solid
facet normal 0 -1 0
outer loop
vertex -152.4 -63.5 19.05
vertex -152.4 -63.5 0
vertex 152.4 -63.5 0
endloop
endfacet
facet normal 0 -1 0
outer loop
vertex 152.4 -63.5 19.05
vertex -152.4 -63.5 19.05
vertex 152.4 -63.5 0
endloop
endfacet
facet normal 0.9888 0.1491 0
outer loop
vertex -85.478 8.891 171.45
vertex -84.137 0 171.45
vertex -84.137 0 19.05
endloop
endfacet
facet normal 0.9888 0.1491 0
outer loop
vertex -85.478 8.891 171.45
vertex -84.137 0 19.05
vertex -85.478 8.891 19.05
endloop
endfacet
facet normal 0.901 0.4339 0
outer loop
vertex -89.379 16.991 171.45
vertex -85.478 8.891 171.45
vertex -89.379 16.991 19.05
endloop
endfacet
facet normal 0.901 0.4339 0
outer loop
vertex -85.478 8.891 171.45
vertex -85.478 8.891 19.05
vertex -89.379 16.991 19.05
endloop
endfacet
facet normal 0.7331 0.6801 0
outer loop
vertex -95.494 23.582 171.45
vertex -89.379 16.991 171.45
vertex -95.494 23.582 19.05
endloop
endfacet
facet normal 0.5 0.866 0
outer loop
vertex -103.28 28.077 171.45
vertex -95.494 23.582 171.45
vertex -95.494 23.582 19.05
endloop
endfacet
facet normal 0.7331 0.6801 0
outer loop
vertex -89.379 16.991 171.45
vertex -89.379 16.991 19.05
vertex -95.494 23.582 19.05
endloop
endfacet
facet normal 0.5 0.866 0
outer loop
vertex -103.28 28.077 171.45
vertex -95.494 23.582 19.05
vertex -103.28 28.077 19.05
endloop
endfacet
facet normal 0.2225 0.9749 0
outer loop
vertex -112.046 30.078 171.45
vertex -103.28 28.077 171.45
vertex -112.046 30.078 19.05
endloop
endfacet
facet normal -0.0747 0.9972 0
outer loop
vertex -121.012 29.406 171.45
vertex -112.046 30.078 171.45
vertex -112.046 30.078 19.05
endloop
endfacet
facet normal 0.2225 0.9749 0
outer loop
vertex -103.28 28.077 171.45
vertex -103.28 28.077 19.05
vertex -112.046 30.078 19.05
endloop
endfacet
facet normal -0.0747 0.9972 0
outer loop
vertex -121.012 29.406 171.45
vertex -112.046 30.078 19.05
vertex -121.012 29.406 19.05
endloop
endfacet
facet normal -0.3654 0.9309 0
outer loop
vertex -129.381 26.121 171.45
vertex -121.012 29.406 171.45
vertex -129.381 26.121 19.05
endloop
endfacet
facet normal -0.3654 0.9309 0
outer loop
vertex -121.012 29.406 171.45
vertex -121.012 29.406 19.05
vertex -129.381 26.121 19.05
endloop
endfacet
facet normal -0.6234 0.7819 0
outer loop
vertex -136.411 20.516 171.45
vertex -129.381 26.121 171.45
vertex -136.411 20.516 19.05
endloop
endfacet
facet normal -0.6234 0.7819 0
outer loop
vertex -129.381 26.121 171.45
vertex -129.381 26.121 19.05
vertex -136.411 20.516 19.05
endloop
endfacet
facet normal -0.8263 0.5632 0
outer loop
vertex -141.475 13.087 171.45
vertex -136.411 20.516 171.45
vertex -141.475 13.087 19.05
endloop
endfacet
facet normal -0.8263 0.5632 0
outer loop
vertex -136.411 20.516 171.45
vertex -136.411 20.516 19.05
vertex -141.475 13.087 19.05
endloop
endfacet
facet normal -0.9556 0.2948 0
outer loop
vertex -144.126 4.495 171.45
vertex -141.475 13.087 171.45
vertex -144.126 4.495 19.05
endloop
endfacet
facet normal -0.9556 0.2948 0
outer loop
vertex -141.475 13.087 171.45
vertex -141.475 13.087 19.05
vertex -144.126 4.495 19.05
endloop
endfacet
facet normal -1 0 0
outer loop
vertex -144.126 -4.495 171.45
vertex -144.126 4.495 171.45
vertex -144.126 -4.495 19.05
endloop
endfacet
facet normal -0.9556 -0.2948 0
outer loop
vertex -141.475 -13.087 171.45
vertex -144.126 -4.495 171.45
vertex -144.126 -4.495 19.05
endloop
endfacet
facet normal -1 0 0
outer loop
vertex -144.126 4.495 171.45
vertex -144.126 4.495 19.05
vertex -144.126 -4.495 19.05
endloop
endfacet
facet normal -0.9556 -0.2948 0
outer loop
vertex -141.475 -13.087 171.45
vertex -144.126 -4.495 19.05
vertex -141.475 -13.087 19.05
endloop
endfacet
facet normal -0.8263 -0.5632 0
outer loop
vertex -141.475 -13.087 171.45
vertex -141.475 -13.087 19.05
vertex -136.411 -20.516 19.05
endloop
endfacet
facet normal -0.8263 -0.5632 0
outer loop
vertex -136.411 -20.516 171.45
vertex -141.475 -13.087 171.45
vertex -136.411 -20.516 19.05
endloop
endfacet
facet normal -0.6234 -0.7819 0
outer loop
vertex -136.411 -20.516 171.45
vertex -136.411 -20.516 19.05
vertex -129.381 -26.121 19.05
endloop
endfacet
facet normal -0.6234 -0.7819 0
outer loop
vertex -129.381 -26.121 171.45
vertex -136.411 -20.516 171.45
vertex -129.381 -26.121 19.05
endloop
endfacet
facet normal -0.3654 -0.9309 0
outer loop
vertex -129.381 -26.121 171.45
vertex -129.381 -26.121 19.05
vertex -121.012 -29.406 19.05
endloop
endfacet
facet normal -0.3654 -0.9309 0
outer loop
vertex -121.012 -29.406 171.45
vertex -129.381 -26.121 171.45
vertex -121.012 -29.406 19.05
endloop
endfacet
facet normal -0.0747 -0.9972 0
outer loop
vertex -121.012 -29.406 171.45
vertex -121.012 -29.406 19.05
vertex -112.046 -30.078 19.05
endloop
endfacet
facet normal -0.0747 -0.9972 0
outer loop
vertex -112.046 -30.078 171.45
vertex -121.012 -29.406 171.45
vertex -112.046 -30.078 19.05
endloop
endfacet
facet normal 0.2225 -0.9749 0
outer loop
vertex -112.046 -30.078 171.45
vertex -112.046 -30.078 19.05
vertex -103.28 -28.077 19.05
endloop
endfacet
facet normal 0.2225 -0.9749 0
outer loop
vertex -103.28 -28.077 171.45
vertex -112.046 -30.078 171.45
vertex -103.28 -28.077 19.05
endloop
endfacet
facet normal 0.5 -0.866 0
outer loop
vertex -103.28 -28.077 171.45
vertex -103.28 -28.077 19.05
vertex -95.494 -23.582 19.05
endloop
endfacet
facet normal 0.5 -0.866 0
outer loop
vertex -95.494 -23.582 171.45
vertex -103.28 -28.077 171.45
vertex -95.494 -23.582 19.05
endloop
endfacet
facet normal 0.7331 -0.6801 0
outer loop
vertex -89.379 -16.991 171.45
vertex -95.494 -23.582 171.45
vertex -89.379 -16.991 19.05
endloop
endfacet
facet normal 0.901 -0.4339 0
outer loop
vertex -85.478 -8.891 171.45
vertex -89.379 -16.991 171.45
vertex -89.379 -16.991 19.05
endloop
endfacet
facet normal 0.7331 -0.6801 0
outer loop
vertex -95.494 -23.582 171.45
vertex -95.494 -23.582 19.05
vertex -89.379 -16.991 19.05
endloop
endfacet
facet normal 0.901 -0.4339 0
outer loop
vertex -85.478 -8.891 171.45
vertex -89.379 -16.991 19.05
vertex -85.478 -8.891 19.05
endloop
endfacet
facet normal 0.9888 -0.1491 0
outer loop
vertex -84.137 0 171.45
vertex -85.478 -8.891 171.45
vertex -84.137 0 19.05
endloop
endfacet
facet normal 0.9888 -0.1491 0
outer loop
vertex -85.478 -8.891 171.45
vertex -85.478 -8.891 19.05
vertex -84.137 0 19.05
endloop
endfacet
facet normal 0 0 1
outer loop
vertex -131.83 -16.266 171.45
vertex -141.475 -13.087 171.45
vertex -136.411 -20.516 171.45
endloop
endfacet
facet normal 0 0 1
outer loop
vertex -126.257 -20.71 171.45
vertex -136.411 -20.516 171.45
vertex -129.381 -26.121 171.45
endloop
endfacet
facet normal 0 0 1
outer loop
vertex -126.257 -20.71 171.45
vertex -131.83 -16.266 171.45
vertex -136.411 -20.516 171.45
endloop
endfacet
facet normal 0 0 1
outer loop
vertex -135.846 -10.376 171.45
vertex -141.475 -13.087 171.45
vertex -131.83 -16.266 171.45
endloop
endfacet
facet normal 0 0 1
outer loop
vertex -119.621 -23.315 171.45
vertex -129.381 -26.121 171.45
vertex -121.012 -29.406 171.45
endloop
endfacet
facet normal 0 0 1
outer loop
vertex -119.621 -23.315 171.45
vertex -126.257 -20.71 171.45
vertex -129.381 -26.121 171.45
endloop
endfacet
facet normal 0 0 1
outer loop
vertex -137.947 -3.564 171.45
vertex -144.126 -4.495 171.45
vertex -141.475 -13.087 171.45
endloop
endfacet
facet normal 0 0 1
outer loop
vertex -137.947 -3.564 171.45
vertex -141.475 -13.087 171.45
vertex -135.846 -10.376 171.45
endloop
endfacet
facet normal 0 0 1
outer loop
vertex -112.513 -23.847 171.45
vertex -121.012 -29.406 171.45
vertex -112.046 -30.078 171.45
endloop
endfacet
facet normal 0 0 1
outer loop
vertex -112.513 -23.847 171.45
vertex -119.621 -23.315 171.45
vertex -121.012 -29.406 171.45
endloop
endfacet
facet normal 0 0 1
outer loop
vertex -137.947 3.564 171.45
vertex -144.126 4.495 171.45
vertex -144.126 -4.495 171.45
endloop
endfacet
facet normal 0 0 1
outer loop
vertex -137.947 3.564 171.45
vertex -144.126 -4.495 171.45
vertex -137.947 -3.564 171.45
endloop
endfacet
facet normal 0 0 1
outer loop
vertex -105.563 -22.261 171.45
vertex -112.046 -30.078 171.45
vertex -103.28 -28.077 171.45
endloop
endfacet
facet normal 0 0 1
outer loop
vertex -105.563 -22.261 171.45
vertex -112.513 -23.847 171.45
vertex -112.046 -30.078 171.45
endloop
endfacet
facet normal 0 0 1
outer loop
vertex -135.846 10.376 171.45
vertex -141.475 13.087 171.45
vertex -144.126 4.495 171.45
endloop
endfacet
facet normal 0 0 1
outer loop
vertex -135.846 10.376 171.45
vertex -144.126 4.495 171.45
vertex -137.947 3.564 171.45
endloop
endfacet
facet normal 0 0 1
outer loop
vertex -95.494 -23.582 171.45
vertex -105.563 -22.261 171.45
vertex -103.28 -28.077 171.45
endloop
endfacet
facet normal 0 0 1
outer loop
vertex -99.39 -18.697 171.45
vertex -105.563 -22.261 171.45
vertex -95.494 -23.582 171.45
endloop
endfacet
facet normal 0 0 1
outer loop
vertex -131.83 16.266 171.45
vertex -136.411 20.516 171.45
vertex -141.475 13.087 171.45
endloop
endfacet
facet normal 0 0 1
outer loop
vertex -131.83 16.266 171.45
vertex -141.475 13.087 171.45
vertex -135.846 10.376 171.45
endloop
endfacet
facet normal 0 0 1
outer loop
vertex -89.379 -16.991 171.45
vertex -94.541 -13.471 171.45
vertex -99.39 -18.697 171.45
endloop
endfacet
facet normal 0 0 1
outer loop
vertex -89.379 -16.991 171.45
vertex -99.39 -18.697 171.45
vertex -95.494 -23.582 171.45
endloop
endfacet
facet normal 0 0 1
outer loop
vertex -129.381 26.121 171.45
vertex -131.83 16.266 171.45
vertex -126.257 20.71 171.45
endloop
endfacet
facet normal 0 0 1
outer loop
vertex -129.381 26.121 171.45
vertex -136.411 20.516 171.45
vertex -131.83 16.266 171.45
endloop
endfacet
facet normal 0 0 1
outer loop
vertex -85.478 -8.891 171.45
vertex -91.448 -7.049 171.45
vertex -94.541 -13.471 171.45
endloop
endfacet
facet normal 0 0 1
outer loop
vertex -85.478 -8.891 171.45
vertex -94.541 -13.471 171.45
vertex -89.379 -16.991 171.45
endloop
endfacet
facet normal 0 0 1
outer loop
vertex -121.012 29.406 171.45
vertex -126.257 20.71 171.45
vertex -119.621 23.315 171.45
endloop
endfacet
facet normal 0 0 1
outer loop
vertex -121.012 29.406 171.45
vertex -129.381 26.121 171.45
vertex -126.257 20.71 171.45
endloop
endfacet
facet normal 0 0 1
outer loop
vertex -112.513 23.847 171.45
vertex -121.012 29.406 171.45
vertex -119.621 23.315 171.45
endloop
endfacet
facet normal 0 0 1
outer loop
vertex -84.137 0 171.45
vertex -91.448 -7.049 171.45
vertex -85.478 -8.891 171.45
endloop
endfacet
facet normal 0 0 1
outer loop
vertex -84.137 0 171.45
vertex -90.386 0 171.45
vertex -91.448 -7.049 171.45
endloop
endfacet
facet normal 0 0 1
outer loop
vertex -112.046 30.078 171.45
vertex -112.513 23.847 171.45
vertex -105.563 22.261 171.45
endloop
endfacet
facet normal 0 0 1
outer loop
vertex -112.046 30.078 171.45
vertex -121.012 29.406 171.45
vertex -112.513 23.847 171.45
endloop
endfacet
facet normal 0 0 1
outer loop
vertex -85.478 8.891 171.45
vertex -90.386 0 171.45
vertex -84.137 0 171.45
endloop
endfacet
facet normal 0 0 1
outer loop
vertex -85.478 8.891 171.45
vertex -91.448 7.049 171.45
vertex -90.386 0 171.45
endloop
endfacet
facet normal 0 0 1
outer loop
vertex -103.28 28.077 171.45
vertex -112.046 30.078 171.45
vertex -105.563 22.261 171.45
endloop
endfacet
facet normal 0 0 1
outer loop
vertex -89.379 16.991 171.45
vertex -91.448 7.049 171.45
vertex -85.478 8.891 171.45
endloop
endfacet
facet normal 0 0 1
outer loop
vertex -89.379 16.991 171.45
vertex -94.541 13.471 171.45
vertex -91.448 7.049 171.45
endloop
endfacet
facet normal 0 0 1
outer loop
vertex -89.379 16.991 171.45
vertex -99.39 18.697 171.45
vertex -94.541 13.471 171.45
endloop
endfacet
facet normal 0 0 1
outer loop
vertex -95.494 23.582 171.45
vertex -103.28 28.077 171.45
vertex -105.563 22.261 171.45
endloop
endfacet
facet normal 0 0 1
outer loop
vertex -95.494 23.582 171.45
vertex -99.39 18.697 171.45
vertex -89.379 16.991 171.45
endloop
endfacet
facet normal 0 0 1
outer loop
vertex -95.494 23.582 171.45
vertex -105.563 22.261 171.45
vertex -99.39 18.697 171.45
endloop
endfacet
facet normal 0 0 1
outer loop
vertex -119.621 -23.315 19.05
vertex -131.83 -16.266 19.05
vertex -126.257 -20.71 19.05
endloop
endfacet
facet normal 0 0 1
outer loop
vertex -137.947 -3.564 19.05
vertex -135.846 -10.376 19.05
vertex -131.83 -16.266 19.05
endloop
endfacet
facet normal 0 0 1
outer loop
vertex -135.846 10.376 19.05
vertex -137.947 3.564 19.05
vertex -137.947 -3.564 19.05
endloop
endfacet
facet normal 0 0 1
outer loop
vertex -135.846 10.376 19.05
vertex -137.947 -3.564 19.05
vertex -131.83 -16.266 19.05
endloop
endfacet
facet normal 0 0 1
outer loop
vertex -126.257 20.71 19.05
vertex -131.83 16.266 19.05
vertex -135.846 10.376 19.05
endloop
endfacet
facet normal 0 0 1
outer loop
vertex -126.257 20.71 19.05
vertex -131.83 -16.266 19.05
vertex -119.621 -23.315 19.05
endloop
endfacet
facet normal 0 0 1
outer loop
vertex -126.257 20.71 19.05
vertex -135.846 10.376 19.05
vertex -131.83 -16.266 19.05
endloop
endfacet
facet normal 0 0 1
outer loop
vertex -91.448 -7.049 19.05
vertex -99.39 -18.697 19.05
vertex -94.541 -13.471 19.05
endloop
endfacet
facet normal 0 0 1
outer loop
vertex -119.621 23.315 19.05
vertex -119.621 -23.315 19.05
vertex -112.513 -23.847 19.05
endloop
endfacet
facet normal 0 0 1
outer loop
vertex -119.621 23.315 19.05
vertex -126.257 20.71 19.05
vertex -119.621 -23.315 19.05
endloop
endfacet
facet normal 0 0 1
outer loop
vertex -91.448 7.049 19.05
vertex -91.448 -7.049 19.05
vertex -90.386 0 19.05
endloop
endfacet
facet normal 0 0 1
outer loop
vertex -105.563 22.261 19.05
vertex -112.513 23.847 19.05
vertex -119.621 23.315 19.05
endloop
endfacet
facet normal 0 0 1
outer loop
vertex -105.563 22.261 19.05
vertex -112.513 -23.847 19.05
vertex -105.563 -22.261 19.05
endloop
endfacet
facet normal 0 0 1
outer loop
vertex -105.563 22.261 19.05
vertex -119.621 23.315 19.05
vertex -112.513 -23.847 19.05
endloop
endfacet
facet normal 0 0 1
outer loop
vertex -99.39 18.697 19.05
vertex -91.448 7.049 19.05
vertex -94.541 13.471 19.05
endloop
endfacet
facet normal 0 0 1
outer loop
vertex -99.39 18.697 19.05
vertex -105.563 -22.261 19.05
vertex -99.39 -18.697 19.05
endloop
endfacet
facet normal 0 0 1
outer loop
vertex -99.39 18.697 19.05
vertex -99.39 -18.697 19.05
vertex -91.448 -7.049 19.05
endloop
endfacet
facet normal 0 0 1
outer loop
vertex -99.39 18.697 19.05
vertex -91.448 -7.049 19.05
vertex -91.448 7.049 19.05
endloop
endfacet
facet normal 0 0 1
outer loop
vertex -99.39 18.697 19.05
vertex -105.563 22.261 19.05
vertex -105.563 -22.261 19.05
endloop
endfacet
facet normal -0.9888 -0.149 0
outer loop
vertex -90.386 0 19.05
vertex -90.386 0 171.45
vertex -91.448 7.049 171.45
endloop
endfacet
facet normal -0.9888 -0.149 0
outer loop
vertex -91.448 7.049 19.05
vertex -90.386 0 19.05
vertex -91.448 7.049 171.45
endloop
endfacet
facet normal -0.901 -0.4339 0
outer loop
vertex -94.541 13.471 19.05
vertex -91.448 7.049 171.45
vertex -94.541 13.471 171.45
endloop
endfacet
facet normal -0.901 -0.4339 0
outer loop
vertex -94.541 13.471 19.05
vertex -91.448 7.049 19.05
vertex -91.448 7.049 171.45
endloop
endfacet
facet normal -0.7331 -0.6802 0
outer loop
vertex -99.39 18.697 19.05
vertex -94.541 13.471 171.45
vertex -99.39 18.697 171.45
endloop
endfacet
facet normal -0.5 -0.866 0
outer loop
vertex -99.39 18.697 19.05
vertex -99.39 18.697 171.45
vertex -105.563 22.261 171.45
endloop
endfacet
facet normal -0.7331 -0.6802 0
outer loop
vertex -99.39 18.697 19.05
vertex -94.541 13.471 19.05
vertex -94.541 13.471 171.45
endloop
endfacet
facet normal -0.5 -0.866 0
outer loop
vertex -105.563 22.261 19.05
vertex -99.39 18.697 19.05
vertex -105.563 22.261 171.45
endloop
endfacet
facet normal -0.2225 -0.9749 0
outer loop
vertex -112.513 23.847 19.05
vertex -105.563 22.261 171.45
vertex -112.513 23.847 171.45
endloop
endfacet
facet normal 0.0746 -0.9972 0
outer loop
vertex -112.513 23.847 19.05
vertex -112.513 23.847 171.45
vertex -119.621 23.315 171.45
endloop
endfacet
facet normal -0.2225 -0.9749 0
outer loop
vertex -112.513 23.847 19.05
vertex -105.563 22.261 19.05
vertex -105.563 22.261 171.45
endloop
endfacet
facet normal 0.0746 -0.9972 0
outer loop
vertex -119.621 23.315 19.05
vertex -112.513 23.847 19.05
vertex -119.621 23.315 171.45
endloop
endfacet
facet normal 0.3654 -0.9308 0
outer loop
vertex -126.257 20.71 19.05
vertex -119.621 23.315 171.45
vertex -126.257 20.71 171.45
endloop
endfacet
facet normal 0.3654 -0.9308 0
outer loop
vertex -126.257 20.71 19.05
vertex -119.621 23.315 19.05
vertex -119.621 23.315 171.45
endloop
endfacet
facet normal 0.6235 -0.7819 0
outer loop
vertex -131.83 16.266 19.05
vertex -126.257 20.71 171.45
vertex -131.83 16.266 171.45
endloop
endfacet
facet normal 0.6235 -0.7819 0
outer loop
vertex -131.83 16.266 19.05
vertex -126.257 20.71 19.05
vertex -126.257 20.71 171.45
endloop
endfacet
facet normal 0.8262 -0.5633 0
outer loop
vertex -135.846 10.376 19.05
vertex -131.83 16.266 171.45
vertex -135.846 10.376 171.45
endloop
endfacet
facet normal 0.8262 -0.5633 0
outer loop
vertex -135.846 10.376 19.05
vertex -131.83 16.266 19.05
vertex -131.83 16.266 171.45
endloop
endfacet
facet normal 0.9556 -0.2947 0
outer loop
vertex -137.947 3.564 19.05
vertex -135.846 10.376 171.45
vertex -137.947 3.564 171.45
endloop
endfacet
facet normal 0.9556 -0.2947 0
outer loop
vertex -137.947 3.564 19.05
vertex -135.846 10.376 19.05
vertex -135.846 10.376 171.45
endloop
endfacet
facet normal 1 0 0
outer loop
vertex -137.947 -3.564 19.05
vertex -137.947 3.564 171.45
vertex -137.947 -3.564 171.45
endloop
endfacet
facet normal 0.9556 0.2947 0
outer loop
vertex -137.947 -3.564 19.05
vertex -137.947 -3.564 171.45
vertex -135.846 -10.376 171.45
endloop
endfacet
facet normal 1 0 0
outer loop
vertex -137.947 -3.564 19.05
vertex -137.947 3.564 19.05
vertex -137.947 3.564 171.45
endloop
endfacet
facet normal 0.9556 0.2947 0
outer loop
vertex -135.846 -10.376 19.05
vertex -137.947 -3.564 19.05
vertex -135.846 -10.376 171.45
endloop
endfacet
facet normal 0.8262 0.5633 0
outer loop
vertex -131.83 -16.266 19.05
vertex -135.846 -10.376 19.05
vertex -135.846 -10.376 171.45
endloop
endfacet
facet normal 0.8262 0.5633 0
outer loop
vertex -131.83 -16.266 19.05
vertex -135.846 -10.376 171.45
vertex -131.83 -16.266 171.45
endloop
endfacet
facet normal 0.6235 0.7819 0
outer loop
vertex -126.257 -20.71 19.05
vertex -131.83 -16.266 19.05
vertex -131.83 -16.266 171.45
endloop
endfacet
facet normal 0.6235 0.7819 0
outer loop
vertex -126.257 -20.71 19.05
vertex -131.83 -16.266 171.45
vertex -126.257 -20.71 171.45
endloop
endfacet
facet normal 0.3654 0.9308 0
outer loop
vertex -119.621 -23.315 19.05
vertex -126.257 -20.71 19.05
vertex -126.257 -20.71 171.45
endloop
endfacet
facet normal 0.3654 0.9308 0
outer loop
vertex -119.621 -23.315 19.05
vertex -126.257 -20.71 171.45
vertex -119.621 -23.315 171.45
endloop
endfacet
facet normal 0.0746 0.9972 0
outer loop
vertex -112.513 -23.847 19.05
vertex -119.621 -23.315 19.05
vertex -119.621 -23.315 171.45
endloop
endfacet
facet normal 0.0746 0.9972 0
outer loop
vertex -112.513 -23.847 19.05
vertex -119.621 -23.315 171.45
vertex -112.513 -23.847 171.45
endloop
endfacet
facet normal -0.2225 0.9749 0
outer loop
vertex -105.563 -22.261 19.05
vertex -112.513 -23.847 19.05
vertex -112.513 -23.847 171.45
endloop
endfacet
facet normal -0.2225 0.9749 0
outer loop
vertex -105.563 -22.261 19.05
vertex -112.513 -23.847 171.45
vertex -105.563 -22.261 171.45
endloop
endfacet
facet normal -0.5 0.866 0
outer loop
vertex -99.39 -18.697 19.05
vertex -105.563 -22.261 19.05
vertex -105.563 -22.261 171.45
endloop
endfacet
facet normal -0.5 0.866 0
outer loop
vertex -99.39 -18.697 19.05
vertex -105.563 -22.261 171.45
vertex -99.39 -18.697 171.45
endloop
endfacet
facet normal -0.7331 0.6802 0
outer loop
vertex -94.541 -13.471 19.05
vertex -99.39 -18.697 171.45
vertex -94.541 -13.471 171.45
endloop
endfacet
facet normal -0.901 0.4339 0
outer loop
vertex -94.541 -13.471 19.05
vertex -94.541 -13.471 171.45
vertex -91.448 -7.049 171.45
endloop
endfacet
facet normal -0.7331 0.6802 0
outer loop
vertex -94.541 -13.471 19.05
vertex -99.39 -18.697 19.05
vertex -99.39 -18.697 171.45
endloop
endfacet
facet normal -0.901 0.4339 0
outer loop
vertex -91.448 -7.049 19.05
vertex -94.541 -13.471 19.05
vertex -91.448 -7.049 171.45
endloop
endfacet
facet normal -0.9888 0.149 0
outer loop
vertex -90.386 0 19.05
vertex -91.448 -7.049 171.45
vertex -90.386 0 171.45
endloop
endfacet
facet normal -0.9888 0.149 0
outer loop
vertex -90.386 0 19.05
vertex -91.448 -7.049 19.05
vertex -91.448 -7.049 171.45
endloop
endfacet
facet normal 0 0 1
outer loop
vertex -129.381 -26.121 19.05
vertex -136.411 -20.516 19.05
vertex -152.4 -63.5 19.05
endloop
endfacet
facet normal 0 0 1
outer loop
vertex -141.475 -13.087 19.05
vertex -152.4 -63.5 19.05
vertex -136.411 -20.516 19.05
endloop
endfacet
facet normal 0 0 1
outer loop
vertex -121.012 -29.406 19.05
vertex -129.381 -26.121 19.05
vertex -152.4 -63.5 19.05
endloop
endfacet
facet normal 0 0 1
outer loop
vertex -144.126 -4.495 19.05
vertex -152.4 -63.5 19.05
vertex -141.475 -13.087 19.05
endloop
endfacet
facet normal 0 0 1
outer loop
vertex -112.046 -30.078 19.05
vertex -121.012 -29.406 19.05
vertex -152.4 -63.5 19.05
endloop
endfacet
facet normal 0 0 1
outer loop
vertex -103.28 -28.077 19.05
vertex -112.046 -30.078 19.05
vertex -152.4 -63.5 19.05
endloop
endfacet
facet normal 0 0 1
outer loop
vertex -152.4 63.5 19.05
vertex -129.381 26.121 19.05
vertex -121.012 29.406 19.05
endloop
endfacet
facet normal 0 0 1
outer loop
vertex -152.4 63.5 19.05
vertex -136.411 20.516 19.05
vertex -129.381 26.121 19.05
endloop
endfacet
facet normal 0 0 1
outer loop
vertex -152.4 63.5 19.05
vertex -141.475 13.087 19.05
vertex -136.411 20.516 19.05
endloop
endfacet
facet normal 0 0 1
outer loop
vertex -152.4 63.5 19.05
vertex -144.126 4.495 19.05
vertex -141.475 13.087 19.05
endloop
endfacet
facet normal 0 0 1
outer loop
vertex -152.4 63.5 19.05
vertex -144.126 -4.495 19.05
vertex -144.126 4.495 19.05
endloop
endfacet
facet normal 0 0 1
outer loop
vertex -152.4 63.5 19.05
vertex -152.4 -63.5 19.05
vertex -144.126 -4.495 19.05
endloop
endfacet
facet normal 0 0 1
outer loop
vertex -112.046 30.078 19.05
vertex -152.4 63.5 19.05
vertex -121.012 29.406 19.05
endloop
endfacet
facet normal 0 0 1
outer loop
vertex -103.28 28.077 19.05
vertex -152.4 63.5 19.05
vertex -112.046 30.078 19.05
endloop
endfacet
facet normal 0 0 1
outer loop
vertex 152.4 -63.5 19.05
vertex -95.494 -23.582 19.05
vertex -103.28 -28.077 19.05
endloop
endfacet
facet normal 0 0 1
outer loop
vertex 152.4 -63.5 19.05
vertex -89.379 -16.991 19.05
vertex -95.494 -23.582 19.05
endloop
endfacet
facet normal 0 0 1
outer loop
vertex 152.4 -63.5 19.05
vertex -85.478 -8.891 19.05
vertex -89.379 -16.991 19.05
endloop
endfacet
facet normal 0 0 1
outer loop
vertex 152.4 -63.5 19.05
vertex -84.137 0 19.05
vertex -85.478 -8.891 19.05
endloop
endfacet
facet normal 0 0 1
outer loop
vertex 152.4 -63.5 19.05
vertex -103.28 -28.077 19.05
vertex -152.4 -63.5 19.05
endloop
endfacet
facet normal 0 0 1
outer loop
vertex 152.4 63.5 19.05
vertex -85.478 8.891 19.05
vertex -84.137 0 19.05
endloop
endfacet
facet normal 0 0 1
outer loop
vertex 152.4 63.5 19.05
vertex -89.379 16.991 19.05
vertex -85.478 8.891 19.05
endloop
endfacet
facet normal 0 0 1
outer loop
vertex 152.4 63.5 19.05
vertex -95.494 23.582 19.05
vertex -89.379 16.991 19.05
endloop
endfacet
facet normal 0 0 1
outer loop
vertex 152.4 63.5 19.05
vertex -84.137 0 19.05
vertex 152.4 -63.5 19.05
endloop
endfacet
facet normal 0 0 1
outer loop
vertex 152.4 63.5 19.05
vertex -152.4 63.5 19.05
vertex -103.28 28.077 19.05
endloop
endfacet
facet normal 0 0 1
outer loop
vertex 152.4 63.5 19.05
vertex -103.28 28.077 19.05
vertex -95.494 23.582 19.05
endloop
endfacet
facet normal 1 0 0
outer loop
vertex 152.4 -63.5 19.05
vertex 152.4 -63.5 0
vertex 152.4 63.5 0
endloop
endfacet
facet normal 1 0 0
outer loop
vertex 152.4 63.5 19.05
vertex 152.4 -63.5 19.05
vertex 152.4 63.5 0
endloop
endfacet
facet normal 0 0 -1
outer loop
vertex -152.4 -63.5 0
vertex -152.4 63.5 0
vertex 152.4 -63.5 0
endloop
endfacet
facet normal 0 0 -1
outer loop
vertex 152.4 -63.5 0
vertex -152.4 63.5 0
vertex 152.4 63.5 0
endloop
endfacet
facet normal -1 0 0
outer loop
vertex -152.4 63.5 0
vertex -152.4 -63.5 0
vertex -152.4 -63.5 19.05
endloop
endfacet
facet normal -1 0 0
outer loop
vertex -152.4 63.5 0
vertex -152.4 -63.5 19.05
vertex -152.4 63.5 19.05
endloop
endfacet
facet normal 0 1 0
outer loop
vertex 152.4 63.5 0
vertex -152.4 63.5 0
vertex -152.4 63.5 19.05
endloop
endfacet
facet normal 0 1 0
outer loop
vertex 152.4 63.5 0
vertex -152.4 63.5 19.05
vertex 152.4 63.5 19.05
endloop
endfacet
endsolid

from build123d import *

# Parameters (mm, degrees)
F0_W     = 304.8
F0_H     = 127
F1_DEPTH = 19.05
F2_R     = 30.1625
F2_R_2   = 23.914231
F3_DEPTH = 152.4


with BuildPart() as f1:
    # F0 (on Top) → F1 (new body)
    with BuildSketch(Plane.XY):
        Rectangle(F0_W, F0_H)
    extrude(amount=F1_DEPTH)

    # F2 (on face) → F3 (join)
    with BuildSketch(Plane.XY.offset(19.05)):
        with Locations((-114.3, 0)):
            Circle(F2_R)
        with Locations((-114.3, 0)):
            Circle(F2_R_2, mode=Mode.SUBTRACT)
    extrude(amount=F3_DEPTH)


solid = f1.part
